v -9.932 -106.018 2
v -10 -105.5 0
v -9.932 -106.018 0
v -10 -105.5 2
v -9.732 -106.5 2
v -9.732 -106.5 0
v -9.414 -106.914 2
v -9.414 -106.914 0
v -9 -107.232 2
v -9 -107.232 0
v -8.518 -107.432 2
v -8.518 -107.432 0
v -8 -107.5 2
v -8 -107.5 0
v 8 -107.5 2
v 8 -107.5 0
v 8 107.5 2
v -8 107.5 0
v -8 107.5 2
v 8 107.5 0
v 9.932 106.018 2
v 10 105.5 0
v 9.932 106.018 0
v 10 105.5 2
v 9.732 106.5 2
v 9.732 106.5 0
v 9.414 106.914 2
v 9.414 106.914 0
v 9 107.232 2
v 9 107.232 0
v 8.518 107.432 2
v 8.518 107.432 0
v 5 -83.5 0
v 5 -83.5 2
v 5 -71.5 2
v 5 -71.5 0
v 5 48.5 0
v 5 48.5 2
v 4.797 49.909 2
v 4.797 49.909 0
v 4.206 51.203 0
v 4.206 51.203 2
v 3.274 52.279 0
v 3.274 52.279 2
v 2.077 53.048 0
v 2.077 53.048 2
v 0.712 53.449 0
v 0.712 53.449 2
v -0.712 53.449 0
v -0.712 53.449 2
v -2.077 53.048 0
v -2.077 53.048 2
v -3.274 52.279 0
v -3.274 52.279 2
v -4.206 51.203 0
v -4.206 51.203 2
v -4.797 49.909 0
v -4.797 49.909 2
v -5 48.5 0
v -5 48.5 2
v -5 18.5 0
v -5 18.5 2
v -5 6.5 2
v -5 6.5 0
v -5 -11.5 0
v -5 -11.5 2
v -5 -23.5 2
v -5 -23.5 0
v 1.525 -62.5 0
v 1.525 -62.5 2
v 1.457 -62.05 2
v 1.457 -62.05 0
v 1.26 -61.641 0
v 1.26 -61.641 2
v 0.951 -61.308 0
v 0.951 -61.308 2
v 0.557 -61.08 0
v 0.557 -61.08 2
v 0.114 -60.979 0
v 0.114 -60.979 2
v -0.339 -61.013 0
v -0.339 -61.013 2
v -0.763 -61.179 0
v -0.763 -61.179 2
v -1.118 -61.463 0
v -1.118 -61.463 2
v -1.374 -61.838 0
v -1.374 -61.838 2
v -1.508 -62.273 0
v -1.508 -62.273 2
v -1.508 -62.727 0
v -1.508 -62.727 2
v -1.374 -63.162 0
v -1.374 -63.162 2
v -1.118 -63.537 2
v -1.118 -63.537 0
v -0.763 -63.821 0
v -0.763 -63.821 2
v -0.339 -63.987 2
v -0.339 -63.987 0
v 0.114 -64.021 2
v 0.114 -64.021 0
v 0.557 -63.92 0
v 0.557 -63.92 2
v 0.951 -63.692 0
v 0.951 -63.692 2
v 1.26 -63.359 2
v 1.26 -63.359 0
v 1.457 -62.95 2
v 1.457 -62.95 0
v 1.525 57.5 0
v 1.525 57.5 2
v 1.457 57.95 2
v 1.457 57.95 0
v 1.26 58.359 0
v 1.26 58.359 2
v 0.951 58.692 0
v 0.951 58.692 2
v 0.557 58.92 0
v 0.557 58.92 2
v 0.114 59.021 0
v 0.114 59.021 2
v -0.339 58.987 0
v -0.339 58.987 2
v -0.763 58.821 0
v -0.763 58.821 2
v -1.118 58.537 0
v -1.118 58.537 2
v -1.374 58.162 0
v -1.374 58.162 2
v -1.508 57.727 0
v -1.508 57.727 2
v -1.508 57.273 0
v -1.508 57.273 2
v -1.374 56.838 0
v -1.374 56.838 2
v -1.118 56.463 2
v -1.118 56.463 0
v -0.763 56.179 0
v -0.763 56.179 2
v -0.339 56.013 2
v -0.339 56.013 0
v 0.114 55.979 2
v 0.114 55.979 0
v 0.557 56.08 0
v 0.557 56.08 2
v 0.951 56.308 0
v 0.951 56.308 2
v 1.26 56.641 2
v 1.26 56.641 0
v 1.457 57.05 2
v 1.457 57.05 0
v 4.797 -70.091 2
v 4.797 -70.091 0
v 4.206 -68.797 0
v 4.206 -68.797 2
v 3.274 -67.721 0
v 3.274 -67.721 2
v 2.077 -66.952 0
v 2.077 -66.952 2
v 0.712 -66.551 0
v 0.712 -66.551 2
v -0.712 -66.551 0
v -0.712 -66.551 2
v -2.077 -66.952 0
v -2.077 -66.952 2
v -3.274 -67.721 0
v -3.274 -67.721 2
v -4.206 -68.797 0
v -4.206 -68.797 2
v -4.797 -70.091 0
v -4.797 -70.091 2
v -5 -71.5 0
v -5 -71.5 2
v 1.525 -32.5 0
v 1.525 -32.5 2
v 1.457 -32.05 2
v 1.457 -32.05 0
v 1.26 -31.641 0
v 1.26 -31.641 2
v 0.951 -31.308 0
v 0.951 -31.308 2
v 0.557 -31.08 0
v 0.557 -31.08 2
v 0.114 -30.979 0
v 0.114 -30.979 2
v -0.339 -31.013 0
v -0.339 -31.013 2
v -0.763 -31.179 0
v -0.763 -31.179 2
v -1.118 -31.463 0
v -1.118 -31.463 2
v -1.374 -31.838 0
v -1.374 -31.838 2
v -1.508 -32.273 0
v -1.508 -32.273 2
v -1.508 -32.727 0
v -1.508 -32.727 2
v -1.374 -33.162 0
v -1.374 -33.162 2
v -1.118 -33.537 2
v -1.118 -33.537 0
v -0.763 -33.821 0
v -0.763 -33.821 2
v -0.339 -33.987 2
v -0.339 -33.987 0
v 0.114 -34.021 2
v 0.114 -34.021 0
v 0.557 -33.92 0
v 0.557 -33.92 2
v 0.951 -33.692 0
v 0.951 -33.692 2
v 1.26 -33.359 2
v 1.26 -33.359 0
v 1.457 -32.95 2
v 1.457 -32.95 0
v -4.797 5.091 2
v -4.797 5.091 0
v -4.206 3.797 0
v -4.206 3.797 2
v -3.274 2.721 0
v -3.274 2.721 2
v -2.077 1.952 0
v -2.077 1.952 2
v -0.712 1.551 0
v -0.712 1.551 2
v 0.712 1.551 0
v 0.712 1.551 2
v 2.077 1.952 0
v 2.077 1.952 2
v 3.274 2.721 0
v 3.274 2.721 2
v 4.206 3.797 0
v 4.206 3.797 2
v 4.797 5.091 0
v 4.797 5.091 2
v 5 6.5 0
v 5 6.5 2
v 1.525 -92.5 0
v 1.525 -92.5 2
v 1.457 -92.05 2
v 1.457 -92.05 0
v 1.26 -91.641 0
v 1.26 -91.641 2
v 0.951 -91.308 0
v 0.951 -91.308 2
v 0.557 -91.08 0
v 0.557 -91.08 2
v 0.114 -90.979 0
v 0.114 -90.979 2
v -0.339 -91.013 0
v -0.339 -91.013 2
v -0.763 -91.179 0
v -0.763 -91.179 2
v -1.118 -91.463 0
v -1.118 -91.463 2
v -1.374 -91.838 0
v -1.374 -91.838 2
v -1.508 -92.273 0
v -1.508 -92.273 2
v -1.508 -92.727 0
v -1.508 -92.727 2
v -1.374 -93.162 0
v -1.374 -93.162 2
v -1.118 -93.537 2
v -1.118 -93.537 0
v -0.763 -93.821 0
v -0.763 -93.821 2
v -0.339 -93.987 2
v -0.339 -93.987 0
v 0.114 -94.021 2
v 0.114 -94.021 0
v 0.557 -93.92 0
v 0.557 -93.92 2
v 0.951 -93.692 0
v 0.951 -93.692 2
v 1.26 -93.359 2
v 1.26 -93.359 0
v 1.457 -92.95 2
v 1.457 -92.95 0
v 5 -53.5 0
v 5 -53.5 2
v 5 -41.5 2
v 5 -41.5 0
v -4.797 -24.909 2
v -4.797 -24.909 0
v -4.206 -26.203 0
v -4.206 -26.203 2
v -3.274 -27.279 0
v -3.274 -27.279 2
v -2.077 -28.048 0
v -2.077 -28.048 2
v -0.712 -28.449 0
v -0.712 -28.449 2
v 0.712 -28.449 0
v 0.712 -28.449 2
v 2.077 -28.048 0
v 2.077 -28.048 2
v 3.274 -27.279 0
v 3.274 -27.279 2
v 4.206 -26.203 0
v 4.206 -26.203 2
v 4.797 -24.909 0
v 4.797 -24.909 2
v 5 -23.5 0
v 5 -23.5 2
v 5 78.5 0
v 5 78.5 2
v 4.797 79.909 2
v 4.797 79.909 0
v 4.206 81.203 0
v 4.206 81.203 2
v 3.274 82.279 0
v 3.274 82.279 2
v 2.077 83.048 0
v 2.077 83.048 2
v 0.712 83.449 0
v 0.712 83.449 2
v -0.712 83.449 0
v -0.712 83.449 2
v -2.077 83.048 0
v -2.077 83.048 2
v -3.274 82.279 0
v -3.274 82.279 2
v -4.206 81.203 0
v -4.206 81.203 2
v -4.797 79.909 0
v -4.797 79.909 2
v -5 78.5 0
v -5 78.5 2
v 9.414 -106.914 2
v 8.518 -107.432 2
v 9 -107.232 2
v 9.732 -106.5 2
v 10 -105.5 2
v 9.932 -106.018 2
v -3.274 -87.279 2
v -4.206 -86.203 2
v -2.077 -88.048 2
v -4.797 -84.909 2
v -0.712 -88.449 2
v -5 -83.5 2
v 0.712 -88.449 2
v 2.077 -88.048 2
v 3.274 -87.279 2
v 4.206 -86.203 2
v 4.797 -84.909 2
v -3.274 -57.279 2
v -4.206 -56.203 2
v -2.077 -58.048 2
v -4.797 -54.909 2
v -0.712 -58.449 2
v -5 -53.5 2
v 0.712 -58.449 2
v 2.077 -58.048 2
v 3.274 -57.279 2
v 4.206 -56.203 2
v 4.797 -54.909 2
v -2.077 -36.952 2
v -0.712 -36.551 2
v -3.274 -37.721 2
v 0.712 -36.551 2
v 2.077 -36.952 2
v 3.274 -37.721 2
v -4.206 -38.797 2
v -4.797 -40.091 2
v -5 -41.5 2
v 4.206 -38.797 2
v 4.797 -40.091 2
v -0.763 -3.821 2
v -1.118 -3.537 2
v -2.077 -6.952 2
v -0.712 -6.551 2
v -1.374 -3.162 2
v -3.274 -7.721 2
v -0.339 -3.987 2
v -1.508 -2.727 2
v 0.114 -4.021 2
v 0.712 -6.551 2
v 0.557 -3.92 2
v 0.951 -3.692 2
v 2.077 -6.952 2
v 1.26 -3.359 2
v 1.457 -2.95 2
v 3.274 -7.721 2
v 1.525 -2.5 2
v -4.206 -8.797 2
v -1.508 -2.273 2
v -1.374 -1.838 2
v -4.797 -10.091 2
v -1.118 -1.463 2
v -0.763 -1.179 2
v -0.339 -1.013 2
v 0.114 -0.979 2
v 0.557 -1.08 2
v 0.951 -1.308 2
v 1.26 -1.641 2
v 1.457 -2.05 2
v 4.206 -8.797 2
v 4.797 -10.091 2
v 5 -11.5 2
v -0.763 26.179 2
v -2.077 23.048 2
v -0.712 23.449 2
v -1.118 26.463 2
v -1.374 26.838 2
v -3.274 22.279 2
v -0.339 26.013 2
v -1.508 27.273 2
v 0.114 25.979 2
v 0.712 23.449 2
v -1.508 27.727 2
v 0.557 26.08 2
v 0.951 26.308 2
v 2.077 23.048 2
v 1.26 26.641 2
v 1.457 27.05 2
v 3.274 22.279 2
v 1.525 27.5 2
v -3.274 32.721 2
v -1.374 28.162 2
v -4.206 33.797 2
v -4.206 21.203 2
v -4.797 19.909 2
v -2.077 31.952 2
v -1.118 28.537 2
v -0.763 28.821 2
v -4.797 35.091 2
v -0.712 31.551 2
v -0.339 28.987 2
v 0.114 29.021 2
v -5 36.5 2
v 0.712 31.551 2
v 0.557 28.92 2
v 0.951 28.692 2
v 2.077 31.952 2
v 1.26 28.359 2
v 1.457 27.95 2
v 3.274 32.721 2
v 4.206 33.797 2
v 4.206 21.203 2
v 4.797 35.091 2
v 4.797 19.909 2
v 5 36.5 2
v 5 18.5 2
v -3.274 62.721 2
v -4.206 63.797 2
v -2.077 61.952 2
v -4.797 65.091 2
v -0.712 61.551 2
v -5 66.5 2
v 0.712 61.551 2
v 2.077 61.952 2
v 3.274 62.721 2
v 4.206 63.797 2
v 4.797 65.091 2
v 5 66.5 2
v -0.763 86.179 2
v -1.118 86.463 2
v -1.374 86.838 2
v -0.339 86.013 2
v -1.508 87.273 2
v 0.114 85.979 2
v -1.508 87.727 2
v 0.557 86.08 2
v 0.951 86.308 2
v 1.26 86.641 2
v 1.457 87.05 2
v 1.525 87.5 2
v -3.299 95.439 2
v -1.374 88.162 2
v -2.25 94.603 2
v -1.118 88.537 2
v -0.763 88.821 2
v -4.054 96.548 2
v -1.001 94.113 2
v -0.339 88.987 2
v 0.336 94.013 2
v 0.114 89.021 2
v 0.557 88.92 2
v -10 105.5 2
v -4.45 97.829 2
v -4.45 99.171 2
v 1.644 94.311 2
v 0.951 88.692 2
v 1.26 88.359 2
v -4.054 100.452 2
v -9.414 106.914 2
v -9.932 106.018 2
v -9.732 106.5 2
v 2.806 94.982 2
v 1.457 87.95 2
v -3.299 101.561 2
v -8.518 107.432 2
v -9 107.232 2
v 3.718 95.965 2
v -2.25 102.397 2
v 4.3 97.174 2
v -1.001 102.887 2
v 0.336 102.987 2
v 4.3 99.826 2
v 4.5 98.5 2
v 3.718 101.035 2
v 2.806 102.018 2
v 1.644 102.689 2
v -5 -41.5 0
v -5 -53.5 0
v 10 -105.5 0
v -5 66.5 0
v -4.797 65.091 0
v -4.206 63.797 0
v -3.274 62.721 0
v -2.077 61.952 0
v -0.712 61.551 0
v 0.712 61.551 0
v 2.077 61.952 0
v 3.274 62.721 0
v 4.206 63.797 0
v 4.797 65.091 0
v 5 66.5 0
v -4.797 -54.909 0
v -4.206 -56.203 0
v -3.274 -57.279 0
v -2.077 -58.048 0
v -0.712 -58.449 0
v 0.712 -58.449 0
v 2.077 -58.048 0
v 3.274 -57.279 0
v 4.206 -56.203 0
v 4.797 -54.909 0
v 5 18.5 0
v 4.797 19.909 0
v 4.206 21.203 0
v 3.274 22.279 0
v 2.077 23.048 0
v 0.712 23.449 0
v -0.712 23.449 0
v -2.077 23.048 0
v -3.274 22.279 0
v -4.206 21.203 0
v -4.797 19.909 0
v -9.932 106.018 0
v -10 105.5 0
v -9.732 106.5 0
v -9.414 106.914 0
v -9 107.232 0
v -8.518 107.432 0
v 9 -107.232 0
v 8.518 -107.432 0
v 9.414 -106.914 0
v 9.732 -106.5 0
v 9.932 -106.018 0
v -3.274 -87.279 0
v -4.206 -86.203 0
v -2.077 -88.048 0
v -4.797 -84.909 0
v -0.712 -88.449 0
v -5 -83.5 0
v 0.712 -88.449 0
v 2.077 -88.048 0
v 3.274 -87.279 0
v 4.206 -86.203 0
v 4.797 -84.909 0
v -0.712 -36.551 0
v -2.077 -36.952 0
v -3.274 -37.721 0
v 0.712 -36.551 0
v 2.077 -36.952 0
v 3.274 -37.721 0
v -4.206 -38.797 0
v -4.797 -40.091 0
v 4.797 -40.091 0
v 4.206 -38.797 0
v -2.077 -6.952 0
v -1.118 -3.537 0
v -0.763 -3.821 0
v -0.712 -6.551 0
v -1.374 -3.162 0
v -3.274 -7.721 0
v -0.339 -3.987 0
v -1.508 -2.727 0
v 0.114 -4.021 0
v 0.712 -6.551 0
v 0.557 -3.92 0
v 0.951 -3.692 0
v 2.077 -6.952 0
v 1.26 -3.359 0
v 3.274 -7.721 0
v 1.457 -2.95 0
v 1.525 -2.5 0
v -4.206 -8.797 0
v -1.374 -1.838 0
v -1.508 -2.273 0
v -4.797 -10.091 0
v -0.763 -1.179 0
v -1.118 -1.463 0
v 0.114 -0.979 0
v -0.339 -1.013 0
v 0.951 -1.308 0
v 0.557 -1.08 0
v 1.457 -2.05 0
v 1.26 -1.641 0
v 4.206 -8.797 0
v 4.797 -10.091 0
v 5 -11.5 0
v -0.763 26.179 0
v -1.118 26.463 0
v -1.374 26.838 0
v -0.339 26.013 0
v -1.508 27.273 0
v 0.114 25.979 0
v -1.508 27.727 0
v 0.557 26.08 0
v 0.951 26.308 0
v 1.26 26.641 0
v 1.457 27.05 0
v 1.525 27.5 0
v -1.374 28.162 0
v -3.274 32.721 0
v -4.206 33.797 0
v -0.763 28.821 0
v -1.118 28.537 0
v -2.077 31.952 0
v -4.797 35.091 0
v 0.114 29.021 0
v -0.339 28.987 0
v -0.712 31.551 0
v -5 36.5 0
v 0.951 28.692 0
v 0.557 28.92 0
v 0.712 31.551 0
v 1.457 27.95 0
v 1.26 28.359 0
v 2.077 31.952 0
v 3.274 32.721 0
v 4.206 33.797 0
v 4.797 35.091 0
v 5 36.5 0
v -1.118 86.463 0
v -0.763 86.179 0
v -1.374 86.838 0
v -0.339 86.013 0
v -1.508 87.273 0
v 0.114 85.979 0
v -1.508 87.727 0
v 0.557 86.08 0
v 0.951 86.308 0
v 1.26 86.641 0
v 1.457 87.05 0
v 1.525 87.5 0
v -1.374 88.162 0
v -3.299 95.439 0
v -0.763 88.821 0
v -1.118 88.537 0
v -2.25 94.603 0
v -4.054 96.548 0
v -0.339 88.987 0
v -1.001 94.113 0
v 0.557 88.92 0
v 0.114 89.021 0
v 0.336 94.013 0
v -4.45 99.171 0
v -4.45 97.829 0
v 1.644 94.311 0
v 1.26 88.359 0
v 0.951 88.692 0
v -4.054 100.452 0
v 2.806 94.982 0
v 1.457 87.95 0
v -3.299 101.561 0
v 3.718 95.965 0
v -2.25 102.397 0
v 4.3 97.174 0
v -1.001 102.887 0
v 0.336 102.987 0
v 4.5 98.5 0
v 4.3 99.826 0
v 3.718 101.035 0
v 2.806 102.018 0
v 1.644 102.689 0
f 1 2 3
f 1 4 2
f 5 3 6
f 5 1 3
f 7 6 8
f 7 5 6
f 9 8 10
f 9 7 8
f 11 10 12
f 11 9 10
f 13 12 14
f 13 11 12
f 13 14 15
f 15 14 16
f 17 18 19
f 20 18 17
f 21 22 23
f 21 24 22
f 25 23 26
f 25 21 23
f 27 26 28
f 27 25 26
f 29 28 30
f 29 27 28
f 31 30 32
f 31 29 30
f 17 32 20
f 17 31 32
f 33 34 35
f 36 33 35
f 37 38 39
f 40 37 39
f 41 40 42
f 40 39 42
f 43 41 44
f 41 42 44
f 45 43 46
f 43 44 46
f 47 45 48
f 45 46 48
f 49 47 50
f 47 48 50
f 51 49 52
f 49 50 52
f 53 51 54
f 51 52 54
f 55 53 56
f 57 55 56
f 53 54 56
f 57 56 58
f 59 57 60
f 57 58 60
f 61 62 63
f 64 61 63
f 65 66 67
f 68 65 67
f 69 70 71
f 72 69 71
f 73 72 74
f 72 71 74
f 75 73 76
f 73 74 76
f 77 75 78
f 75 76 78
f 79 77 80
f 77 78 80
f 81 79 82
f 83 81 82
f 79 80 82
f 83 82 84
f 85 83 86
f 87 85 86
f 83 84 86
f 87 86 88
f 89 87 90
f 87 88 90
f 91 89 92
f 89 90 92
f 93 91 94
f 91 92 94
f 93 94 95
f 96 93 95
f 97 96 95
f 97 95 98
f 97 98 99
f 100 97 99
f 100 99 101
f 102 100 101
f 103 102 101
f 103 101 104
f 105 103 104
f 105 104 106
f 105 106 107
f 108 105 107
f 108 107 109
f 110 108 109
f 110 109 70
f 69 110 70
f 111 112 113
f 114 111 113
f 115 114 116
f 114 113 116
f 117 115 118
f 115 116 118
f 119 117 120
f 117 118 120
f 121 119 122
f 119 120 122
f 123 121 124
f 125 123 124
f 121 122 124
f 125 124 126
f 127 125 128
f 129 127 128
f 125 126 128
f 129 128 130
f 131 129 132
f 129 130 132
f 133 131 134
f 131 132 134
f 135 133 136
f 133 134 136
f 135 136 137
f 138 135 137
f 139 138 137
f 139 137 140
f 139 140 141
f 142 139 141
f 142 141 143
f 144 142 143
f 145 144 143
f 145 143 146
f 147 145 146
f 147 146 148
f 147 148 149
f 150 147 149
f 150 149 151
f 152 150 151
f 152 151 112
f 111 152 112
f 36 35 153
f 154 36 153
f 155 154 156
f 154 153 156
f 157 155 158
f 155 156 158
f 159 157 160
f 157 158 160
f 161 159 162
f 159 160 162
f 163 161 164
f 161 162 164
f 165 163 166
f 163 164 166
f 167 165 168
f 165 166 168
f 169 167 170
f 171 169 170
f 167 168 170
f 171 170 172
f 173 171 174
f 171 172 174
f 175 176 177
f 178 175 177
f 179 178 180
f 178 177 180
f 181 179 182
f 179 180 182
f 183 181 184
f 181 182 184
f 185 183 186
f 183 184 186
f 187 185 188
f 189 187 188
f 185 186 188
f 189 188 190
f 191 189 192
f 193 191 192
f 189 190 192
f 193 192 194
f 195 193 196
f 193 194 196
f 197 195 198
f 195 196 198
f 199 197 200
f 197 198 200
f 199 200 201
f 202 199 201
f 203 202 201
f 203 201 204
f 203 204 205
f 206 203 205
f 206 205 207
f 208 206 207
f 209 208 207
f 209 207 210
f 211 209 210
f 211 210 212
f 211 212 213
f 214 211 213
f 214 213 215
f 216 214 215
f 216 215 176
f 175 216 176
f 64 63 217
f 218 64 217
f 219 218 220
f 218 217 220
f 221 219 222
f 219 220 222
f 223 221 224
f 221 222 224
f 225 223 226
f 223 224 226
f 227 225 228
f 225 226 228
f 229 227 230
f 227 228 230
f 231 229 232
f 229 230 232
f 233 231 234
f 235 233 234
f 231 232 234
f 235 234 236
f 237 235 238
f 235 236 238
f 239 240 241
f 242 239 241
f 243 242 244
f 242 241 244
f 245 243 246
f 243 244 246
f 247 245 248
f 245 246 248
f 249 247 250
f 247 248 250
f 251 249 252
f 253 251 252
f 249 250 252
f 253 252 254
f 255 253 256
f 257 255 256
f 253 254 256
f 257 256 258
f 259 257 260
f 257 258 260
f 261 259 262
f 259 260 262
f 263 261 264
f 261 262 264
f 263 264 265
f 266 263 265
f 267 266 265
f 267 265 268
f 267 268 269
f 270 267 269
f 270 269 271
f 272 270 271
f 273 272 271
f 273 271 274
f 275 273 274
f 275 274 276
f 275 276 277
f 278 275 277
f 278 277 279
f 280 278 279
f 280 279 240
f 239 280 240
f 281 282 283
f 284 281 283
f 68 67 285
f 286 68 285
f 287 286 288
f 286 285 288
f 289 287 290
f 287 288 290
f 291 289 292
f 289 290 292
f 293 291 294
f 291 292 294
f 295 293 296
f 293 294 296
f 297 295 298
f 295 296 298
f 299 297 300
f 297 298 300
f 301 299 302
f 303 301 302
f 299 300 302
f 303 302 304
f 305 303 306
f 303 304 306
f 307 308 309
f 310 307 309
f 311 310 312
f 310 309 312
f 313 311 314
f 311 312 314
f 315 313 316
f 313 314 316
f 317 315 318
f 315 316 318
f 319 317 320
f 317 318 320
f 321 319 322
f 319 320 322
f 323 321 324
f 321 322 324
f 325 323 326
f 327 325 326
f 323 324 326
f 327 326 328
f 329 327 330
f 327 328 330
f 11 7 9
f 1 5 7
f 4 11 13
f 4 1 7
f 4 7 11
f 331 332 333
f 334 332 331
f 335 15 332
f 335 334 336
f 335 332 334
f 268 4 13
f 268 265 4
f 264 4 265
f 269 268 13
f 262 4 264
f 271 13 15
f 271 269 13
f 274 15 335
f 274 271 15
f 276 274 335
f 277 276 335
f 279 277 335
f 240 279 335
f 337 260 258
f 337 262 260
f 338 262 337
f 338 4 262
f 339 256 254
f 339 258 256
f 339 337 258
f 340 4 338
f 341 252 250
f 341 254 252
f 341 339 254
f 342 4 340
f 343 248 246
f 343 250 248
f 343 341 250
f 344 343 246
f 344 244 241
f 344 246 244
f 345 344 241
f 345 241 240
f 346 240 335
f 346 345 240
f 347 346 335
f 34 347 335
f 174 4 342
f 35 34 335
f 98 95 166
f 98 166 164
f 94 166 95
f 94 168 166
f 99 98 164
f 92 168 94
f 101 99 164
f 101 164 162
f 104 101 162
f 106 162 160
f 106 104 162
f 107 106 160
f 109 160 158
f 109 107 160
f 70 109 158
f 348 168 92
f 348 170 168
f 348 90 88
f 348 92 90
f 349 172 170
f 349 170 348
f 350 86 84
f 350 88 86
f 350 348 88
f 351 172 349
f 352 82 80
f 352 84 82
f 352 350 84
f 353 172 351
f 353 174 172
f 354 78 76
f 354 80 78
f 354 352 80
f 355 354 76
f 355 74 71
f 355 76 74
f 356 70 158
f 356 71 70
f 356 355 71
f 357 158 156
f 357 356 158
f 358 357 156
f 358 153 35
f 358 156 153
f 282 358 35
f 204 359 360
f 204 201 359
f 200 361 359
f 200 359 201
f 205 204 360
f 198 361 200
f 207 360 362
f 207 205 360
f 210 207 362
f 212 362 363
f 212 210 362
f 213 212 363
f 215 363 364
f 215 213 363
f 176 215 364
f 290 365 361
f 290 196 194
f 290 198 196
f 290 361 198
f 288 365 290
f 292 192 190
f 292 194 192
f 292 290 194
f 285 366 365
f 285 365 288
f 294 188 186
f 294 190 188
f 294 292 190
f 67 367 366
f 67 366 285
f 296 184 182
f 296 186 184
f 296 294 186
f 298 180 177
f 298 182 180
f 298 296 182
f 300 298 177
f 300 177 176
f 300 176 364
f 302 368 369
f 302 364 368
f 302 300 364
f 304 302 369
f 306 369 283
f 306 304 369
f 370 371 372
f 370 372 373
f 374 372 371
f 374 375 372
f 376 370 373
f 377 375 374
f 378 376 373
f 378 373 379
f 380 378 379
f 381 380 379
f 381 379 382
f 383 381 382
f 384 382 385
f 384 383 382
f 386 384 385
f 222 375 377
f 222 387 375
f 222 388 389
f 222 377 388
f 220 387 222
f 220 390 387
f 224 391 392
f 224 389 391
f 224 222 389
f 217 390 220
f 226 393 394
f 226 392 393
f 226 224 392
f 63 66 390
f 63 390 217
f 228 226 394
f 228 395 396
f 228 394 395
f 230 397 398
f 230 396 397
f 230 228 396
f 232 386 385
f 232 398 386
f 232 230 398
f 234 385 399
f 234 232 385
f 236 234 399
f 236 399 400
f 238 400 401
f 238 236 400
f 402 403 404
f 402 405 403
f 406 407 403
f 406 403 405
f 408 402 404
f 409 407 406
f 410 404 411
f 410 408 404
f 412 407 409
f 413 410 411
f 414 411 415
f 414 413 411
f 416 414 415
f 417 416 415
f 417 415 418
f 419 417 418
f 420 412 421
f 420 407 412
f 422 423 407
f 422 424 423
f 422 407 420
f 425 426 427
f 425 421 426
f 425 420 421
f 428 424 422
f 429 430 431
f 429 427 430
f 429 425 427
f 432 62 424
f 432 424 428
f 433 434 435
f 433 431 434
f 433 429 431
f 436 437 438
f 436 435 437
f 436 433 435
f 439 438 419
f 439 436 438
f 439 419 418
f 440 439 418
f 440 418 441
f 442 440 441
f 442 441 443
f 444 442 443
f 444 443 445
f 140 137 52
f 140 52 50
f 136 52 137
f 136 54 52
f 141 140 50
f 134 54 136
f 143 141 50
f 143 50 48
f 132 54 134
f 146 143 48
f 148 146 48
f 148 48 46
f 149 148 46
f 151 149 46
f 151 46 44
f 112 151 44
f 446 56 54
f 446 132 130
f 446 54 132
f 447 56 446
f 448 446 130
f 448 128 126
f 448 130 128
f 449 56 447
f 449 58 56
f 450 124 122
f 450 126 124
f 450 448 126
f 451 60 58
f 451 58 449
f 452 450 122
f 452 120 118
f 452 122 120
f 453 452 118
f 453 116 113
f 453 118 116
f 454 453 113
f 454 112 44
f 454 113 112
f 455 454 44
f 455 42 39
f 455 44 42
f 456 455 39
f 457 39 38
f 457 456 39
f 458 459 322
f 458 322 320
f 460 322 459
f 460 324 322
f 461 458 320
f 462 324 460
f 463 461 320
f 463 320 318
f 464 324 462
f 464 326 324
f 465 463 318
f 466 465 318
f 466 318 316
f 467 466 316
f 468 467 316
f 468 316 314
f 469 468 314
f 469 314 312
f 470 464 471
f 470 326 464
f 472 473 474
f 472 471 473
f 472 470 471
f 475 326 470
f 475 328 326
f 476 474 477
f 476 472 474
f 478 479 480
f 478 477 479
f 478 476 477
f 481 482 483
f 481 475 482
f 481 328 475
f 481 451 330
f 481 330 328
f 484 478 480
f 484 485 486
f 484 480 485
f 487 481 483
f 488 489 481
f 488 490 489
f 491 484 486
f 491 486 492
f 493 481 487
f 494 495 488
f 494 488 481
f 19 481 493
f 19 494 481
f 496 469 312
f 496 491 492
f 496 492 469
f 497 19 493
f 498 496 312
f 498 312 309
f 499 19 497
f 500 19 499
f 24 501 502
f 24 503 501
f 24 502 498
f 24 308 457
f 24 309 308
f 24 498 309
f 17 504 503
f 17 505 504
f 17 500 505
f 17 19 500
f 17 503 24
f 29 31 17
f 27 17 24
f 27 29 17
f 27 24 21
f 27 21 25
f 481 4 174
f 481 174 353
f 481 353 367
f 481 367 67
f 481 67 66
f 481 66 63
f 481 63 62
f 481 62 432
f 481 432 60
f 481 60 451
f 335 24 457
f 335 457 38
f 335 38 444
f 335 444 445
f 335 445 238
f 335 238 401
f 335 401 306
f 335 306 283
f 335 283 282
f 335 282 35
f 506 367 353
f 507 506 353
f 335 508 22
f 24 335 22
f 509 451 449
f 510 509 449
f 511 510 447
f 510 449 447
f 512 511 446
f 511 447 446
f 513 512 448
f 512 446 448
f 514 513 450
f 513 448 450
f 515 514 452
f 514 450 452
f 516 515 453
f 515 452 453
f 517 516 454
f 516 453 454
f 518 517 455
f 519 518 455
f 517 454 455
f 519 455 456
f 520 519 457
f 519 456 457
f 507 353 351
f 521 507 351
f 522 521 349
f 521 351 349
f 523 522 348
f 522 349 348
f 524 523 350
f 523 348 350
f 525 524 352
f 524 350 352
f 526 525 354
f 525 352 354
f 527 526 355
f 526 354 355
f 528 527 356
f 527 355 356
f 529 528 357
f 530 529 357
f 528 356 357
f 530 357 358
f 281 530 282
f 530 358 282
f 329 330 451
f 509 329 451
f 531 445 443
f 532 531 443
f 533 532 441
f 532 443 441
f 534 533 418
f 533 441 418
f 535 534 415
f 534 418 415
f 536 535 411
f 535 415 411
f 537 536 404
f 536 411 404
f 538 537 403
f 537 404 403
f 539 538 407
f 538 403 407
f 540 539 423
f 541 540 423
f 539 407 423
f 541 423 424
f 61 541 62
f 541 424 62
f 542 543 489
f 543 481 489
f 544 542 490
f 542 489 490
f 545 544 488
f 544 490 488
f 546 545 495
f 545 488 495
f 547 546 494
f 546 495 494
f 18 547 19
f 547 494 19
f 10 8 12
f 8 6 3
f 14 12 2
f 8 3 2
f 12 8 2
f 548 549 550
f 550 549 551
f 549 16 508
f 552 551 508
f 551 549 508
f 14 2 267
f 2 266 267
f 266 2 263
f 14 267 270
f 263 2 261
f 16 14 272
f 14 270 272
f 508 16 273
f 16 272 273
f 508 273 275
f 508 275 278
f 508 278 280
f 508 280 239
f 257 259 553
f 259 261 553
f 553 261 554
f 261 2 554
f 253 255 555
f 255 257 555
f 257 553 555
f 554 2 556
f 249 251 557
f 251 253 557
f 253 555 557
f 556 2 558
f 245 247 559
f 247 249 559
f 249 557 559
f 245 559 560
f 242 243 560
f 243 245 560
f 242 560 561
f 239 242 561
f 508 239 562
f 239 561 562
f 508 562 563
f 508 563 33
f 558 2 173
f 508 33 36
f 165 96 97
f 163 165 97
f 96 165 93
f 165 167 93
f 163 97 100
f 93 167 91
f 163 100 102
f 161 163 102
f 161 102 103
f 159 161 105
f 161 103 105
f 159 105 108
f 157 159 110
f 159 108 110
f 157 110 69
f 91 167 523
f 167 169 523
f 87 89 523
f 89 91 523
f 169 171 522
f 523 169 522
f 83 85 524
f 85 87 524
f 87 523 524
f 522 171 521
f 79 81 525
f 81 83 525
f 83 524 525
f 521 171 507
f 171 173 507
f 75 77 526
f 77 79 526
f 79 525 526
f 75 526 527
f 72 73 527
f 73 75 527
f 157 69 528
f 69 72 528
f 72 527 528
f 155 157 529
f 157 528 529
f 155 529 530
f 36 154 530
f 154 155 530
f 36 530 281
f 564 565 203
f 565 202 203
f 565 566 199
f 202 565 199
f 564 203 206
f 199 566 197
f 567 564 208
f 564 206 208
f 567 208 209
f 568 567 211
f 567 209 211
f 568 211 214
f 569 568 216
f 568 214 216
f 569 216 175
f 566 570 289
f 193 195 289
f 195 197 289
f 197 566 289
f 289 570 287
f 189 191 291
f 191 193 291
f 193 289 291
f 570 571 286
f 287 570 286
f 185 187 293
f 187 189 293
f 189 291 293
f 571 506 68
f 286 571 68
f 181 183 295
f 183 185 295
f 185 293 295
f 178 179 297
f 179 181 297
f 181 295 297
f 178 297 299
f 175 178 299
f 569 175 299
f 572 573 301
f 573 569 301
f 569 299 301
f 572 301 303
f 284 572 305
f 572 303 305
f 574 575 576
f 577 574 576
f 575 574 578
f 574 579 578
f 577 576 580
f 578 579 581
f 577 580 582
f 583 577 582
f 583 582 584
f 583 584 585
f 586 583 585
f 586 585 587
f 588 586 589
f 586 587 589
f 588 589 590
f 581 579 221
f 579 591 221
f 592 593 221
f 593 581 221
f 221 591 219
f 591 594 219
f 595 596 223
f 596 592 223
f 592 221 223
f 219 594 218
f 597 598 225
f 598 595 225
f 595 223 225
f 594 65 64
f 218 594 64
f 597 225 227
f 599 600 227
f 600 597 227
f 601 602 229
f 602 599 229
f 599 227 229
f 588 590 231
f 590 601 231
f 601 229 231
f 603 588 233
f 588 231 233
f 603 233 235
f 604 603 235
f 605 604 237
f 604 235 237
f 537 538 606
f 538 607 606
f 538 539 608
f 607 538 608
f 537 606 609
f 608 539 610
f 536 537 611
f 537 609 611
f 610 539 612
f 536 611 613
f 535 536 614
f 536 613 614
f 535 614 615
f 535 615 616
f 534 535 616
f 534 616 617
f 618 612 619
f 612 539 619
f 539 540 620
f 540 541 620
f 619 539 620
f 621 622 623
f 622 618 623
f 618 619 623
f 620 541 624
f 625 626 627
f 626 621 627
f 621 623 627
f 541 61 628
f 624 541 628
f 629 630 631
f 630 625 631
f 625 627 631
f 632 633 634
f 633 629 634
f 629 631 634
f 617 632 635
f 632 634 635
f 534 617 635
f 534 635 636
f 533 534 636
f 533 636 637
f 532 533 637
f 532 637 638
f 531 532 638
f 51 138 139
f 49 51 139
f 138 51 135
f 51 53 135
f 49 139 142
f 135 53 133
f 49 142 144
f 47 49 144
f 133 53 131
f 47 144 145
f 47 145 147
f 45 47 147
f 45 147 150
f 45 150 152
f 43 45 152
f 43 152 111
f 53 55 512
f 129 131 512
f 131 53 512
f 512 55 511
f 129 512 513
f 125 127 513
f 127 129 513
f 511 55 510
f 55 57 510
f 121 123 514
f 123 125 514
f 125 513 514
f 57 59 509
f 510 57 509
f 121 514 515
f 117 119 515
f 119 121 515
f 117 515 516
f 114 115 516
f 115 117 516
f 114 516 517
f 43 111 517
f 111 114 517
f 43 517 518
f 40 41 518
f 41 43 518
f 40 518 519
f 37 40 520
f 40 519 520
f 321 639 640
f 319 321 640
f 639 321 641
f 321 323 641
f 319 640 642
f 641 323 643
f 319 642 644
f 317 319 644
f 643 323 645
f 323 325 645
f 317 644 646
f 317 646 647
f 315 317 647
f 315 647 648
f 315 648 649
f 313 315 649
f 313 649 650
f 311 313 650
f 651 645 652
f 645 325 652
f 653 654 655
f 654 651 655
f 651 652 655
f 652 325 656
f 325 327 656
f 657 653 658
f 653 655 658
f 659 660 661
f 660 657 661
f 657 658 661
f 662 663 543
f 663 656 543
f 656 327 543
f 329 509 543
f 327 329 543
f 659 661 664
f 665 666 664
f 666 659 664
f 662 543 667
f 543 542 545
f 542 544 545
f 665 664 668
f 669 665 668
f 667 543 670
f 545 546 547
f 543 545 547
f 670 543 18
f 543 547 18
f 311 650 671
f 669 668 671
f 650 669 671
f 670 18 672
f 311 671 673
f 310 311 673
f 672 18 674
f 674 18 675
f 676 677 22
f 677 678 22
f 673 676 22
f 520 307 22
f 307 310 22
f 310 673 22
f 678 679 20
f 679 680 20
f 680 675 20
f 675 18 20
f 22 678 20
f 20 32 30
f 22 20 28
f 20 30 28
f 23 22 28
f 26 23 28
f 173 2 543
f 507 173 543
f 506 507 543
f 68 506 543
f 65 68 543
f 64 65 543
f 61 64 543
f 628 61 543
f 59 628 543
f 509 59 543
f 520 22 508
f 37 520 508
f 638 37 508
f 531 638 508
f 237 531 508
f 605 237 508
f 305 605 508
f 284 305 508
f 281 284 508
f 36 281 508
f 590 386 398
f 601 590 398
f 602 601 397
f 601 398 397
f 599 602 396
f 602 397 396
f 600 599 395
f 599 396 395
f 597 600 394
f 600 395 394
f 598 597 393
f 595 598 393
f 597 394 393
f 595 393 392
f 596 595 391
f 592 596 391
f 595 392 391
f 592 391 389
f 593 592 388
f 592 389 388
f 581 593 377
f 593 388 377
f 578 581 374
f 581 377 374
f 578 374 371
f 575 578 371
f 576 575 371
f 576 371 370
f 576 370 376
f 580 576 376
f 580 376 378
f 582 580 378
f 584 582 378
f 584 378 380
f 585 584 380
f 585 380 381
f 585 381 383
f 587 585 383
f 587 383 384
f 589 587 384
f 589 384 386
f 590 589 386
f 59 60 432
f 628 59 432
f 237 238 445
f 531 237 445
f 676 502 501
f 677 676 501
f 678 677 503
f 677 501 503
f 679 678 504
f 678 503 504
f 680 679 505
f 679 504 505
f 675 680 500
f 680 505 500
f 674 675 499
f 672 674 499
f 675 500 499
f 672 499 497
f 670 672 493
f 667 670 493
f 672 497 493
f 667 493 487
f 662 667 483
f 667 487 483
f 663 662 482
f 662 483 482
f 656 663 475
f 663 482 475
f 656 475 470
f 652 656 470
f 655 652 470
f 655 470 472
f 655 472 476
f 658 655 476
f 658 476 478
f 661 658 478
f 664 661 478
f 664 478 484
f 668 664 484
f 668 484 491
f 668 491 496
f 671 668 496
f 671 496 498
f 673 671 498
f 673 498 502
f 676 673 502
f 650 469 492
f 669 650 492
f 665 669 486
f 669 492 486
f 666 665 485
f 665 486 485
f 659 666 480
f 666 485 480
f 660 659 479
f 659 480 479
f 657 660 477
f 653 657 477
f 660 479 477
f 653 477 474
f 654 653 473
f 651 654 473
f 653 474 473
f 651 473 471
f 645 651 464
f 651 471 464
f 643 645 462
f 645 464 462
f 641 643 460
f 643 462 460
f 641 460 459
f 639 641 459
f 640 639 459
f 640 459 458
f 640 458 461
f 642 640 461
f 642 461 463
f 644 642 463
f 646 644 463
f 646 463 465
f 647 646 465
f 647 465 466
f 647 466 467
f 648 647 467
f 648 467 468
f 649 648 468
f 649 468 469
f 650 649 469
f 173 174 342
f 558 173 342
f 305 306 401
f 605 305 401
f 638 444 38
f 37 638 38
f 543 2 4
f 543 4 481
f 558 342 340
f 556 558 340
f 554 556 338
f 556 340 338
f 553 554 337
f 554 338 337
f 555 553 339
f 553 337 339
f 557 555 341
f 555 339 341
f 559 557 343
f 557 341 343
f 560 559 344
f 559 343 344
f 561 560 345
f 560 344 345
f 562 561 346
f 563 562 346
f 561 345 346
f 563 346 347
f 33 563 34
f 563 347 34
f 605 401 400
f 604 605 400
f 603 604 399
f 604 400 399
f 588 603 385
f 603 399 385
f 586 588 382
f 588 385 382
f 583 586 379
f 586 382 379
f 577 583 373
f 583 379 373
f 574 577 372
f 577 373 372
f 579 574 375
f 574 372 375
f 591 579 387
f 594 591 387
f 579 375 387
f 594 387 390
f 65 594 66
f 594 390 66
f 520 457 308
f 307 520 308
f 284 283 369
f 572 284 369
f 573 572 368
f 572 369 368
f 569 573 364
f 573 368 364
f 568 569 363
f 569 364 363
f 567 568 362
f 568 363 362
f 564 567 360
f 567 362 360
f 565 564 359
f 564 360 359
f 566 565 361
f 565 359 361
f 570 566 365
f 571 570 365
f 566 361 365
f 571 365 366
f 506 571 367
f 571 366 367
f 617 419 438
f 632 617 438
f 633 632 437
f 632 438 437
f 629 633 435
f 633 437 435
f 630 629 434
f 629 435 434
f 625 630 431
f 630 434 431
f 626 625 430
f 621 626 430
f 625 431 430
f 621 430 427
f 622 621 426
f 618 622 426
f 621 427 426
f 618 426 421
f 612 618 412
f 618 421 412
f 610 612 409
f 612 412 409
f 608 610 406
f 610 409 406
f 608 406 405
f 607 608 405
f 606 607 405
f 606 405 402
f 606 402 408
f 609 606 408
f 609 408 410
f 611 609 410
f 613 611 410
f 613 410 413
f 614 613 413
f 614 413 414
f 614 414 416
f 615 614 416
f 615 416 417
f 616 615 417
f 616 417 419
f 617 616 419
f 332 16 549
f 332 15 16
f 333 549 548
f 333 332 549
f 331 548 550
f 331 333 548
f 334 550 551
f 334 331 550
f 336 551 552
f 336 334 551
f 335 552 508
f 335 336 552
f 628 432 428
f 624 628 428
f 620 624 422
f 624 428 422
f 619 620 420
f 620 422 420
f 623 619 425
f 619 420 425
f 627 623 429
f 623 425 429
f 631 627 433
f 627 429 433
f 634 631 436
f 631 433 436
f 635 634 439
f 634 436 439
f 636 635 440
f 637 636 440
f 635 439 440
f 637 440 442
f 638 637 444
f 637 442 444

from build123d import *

# Parameters (mm, degrees)
SKETCH_1_W          = 20
SKETCH_1_H          = 215
EXTRUDE_1_DEPTH     = 2
FILLET_1_R          = 2
SKETCH_2_R          = 1.525
CUT_EXTRUDE_1_DEPTH = 10
SKETCH_4_R          = 4.5
CUT_EXTRUDE_2_DEPTH = 10


with BuildPart() as part:
    # 草图1 → 凸台-拉伸1 (new body)
    with BuildSketch(Plane.XY):
        Rectangle(SKETCH_1_W, SKETCH_1_H)
    extrude(amount=EXTRUDE_1_DEPTH)

    # 圆角1
    fillet_1_edges = [part.edges().sort_by_distance(p)[0] for p in [
        (10, -107.5, 1),
        (-10, -107.5, 1),
        (-10, 107.5, 1),
        (10, 107.5, 1),
    ]]
    fillet(fillet_1_edges, radius=FILLET_1_R)

    # 草图2 → 切除-拉伸1 (cut)
    with BuildSketch(Plane.XY.offset(2)):
        with Locations((0, 87.5)):
            Circle(SKETCH_2_R)
        with Locations((0, 57.5)):
            Circle(SKETCH_2_R)
        with Locations((0, 27.5)):
            Circle(SKETCH_2_R)
        with Locations((0, -2.5)):
            Circle(SKETCH_2_R)
        with Locations((0, -32.5)):
            Circle(SKETCH_2_R)
        with Locations((0, -62.5)):
            Circle(SKETCH_2_R)
        with Locations((0, -92.5)):
            Circle(SKETCH_2_R)
    extrude(amount=-CUT_EXTRUDE_1_DEPTH, mode=Mode.SUBTRACT)

    # 草图4 → 切除-拉伸2 (cut)
    with BuildSketch(Plane.XY.offset(2)):
        with Locations((0, 98.5)):
            Circle(SKETCH_4_R)
        with BuildLine():
            Line((5, 66.5), (5, 78.5))
            ThreePointArc((5, 78.5), (0, 83.5), (-5, 78.5))
            Line((-5, 78.5), (-5, 66.5))
            ThreePointArc((-5, 66.5), (0, 61.5), (5, 66.5))
        make_face()
        with BuildLine():
            Line((5, 36.5), (5, 48.5))
            ThreePointArc((5, 48.5), (0, 53.5), (-5, 48.5))
            Line((-5, 48.5), (-5, 36.5))
            ThreePointArc((-5, 36.5), (0, 31.5), (5, 36.5))
        make_face()
        with BuildLine():
            Line((5, -83.5), (5, -71.5))
            ThreePointArc((5, -71.5), (0, -66.5), (-5, -71.5))
            Line((-5, -71.5), (-5, -83.5))
            ThreePointArc((-5, -83.5), (0, -88.5), (5, -83.5))
        make_face()
        with BuildLine():
            Line((5, 6.5), (5, 18.5))
            ThreePointArc((5, 18.5), (0, 23.5), (-5, 18.5))
            Line((-5, 18.5), (-5, 6.5))
            ThreePointArc((-5, 6.5), (0, 1.5), (5, 6.5))
        make_face()
        with BuildLine():
            Line((5, -23.5), (5, -11.5))
            ThreePointArc((5, -11.5), (0, -6.5), (-5, -11.5))
            Line((-5, -11.5), (-5, -23.5))
            ThreePointArc((-5, -23.5), (0, -28.5), (5, -23.5))
        make_face()
        with BuildLine():
            Line((5, -53.5), (5, -41.5))
            ThreePointArc((5, -41.5), (0, -36.5), (-5, -41.5))
            Line((-5, -41.5), (-5, -53.5))
            ThreePointArc((-5, -53.5), (0, -58.5), (5, -53.5))
        make_face()
    extrude(amount=-CUT_EXTRUDE_2_DEPTH, mode=Mode.SUBTRACT)


solid = part.part
